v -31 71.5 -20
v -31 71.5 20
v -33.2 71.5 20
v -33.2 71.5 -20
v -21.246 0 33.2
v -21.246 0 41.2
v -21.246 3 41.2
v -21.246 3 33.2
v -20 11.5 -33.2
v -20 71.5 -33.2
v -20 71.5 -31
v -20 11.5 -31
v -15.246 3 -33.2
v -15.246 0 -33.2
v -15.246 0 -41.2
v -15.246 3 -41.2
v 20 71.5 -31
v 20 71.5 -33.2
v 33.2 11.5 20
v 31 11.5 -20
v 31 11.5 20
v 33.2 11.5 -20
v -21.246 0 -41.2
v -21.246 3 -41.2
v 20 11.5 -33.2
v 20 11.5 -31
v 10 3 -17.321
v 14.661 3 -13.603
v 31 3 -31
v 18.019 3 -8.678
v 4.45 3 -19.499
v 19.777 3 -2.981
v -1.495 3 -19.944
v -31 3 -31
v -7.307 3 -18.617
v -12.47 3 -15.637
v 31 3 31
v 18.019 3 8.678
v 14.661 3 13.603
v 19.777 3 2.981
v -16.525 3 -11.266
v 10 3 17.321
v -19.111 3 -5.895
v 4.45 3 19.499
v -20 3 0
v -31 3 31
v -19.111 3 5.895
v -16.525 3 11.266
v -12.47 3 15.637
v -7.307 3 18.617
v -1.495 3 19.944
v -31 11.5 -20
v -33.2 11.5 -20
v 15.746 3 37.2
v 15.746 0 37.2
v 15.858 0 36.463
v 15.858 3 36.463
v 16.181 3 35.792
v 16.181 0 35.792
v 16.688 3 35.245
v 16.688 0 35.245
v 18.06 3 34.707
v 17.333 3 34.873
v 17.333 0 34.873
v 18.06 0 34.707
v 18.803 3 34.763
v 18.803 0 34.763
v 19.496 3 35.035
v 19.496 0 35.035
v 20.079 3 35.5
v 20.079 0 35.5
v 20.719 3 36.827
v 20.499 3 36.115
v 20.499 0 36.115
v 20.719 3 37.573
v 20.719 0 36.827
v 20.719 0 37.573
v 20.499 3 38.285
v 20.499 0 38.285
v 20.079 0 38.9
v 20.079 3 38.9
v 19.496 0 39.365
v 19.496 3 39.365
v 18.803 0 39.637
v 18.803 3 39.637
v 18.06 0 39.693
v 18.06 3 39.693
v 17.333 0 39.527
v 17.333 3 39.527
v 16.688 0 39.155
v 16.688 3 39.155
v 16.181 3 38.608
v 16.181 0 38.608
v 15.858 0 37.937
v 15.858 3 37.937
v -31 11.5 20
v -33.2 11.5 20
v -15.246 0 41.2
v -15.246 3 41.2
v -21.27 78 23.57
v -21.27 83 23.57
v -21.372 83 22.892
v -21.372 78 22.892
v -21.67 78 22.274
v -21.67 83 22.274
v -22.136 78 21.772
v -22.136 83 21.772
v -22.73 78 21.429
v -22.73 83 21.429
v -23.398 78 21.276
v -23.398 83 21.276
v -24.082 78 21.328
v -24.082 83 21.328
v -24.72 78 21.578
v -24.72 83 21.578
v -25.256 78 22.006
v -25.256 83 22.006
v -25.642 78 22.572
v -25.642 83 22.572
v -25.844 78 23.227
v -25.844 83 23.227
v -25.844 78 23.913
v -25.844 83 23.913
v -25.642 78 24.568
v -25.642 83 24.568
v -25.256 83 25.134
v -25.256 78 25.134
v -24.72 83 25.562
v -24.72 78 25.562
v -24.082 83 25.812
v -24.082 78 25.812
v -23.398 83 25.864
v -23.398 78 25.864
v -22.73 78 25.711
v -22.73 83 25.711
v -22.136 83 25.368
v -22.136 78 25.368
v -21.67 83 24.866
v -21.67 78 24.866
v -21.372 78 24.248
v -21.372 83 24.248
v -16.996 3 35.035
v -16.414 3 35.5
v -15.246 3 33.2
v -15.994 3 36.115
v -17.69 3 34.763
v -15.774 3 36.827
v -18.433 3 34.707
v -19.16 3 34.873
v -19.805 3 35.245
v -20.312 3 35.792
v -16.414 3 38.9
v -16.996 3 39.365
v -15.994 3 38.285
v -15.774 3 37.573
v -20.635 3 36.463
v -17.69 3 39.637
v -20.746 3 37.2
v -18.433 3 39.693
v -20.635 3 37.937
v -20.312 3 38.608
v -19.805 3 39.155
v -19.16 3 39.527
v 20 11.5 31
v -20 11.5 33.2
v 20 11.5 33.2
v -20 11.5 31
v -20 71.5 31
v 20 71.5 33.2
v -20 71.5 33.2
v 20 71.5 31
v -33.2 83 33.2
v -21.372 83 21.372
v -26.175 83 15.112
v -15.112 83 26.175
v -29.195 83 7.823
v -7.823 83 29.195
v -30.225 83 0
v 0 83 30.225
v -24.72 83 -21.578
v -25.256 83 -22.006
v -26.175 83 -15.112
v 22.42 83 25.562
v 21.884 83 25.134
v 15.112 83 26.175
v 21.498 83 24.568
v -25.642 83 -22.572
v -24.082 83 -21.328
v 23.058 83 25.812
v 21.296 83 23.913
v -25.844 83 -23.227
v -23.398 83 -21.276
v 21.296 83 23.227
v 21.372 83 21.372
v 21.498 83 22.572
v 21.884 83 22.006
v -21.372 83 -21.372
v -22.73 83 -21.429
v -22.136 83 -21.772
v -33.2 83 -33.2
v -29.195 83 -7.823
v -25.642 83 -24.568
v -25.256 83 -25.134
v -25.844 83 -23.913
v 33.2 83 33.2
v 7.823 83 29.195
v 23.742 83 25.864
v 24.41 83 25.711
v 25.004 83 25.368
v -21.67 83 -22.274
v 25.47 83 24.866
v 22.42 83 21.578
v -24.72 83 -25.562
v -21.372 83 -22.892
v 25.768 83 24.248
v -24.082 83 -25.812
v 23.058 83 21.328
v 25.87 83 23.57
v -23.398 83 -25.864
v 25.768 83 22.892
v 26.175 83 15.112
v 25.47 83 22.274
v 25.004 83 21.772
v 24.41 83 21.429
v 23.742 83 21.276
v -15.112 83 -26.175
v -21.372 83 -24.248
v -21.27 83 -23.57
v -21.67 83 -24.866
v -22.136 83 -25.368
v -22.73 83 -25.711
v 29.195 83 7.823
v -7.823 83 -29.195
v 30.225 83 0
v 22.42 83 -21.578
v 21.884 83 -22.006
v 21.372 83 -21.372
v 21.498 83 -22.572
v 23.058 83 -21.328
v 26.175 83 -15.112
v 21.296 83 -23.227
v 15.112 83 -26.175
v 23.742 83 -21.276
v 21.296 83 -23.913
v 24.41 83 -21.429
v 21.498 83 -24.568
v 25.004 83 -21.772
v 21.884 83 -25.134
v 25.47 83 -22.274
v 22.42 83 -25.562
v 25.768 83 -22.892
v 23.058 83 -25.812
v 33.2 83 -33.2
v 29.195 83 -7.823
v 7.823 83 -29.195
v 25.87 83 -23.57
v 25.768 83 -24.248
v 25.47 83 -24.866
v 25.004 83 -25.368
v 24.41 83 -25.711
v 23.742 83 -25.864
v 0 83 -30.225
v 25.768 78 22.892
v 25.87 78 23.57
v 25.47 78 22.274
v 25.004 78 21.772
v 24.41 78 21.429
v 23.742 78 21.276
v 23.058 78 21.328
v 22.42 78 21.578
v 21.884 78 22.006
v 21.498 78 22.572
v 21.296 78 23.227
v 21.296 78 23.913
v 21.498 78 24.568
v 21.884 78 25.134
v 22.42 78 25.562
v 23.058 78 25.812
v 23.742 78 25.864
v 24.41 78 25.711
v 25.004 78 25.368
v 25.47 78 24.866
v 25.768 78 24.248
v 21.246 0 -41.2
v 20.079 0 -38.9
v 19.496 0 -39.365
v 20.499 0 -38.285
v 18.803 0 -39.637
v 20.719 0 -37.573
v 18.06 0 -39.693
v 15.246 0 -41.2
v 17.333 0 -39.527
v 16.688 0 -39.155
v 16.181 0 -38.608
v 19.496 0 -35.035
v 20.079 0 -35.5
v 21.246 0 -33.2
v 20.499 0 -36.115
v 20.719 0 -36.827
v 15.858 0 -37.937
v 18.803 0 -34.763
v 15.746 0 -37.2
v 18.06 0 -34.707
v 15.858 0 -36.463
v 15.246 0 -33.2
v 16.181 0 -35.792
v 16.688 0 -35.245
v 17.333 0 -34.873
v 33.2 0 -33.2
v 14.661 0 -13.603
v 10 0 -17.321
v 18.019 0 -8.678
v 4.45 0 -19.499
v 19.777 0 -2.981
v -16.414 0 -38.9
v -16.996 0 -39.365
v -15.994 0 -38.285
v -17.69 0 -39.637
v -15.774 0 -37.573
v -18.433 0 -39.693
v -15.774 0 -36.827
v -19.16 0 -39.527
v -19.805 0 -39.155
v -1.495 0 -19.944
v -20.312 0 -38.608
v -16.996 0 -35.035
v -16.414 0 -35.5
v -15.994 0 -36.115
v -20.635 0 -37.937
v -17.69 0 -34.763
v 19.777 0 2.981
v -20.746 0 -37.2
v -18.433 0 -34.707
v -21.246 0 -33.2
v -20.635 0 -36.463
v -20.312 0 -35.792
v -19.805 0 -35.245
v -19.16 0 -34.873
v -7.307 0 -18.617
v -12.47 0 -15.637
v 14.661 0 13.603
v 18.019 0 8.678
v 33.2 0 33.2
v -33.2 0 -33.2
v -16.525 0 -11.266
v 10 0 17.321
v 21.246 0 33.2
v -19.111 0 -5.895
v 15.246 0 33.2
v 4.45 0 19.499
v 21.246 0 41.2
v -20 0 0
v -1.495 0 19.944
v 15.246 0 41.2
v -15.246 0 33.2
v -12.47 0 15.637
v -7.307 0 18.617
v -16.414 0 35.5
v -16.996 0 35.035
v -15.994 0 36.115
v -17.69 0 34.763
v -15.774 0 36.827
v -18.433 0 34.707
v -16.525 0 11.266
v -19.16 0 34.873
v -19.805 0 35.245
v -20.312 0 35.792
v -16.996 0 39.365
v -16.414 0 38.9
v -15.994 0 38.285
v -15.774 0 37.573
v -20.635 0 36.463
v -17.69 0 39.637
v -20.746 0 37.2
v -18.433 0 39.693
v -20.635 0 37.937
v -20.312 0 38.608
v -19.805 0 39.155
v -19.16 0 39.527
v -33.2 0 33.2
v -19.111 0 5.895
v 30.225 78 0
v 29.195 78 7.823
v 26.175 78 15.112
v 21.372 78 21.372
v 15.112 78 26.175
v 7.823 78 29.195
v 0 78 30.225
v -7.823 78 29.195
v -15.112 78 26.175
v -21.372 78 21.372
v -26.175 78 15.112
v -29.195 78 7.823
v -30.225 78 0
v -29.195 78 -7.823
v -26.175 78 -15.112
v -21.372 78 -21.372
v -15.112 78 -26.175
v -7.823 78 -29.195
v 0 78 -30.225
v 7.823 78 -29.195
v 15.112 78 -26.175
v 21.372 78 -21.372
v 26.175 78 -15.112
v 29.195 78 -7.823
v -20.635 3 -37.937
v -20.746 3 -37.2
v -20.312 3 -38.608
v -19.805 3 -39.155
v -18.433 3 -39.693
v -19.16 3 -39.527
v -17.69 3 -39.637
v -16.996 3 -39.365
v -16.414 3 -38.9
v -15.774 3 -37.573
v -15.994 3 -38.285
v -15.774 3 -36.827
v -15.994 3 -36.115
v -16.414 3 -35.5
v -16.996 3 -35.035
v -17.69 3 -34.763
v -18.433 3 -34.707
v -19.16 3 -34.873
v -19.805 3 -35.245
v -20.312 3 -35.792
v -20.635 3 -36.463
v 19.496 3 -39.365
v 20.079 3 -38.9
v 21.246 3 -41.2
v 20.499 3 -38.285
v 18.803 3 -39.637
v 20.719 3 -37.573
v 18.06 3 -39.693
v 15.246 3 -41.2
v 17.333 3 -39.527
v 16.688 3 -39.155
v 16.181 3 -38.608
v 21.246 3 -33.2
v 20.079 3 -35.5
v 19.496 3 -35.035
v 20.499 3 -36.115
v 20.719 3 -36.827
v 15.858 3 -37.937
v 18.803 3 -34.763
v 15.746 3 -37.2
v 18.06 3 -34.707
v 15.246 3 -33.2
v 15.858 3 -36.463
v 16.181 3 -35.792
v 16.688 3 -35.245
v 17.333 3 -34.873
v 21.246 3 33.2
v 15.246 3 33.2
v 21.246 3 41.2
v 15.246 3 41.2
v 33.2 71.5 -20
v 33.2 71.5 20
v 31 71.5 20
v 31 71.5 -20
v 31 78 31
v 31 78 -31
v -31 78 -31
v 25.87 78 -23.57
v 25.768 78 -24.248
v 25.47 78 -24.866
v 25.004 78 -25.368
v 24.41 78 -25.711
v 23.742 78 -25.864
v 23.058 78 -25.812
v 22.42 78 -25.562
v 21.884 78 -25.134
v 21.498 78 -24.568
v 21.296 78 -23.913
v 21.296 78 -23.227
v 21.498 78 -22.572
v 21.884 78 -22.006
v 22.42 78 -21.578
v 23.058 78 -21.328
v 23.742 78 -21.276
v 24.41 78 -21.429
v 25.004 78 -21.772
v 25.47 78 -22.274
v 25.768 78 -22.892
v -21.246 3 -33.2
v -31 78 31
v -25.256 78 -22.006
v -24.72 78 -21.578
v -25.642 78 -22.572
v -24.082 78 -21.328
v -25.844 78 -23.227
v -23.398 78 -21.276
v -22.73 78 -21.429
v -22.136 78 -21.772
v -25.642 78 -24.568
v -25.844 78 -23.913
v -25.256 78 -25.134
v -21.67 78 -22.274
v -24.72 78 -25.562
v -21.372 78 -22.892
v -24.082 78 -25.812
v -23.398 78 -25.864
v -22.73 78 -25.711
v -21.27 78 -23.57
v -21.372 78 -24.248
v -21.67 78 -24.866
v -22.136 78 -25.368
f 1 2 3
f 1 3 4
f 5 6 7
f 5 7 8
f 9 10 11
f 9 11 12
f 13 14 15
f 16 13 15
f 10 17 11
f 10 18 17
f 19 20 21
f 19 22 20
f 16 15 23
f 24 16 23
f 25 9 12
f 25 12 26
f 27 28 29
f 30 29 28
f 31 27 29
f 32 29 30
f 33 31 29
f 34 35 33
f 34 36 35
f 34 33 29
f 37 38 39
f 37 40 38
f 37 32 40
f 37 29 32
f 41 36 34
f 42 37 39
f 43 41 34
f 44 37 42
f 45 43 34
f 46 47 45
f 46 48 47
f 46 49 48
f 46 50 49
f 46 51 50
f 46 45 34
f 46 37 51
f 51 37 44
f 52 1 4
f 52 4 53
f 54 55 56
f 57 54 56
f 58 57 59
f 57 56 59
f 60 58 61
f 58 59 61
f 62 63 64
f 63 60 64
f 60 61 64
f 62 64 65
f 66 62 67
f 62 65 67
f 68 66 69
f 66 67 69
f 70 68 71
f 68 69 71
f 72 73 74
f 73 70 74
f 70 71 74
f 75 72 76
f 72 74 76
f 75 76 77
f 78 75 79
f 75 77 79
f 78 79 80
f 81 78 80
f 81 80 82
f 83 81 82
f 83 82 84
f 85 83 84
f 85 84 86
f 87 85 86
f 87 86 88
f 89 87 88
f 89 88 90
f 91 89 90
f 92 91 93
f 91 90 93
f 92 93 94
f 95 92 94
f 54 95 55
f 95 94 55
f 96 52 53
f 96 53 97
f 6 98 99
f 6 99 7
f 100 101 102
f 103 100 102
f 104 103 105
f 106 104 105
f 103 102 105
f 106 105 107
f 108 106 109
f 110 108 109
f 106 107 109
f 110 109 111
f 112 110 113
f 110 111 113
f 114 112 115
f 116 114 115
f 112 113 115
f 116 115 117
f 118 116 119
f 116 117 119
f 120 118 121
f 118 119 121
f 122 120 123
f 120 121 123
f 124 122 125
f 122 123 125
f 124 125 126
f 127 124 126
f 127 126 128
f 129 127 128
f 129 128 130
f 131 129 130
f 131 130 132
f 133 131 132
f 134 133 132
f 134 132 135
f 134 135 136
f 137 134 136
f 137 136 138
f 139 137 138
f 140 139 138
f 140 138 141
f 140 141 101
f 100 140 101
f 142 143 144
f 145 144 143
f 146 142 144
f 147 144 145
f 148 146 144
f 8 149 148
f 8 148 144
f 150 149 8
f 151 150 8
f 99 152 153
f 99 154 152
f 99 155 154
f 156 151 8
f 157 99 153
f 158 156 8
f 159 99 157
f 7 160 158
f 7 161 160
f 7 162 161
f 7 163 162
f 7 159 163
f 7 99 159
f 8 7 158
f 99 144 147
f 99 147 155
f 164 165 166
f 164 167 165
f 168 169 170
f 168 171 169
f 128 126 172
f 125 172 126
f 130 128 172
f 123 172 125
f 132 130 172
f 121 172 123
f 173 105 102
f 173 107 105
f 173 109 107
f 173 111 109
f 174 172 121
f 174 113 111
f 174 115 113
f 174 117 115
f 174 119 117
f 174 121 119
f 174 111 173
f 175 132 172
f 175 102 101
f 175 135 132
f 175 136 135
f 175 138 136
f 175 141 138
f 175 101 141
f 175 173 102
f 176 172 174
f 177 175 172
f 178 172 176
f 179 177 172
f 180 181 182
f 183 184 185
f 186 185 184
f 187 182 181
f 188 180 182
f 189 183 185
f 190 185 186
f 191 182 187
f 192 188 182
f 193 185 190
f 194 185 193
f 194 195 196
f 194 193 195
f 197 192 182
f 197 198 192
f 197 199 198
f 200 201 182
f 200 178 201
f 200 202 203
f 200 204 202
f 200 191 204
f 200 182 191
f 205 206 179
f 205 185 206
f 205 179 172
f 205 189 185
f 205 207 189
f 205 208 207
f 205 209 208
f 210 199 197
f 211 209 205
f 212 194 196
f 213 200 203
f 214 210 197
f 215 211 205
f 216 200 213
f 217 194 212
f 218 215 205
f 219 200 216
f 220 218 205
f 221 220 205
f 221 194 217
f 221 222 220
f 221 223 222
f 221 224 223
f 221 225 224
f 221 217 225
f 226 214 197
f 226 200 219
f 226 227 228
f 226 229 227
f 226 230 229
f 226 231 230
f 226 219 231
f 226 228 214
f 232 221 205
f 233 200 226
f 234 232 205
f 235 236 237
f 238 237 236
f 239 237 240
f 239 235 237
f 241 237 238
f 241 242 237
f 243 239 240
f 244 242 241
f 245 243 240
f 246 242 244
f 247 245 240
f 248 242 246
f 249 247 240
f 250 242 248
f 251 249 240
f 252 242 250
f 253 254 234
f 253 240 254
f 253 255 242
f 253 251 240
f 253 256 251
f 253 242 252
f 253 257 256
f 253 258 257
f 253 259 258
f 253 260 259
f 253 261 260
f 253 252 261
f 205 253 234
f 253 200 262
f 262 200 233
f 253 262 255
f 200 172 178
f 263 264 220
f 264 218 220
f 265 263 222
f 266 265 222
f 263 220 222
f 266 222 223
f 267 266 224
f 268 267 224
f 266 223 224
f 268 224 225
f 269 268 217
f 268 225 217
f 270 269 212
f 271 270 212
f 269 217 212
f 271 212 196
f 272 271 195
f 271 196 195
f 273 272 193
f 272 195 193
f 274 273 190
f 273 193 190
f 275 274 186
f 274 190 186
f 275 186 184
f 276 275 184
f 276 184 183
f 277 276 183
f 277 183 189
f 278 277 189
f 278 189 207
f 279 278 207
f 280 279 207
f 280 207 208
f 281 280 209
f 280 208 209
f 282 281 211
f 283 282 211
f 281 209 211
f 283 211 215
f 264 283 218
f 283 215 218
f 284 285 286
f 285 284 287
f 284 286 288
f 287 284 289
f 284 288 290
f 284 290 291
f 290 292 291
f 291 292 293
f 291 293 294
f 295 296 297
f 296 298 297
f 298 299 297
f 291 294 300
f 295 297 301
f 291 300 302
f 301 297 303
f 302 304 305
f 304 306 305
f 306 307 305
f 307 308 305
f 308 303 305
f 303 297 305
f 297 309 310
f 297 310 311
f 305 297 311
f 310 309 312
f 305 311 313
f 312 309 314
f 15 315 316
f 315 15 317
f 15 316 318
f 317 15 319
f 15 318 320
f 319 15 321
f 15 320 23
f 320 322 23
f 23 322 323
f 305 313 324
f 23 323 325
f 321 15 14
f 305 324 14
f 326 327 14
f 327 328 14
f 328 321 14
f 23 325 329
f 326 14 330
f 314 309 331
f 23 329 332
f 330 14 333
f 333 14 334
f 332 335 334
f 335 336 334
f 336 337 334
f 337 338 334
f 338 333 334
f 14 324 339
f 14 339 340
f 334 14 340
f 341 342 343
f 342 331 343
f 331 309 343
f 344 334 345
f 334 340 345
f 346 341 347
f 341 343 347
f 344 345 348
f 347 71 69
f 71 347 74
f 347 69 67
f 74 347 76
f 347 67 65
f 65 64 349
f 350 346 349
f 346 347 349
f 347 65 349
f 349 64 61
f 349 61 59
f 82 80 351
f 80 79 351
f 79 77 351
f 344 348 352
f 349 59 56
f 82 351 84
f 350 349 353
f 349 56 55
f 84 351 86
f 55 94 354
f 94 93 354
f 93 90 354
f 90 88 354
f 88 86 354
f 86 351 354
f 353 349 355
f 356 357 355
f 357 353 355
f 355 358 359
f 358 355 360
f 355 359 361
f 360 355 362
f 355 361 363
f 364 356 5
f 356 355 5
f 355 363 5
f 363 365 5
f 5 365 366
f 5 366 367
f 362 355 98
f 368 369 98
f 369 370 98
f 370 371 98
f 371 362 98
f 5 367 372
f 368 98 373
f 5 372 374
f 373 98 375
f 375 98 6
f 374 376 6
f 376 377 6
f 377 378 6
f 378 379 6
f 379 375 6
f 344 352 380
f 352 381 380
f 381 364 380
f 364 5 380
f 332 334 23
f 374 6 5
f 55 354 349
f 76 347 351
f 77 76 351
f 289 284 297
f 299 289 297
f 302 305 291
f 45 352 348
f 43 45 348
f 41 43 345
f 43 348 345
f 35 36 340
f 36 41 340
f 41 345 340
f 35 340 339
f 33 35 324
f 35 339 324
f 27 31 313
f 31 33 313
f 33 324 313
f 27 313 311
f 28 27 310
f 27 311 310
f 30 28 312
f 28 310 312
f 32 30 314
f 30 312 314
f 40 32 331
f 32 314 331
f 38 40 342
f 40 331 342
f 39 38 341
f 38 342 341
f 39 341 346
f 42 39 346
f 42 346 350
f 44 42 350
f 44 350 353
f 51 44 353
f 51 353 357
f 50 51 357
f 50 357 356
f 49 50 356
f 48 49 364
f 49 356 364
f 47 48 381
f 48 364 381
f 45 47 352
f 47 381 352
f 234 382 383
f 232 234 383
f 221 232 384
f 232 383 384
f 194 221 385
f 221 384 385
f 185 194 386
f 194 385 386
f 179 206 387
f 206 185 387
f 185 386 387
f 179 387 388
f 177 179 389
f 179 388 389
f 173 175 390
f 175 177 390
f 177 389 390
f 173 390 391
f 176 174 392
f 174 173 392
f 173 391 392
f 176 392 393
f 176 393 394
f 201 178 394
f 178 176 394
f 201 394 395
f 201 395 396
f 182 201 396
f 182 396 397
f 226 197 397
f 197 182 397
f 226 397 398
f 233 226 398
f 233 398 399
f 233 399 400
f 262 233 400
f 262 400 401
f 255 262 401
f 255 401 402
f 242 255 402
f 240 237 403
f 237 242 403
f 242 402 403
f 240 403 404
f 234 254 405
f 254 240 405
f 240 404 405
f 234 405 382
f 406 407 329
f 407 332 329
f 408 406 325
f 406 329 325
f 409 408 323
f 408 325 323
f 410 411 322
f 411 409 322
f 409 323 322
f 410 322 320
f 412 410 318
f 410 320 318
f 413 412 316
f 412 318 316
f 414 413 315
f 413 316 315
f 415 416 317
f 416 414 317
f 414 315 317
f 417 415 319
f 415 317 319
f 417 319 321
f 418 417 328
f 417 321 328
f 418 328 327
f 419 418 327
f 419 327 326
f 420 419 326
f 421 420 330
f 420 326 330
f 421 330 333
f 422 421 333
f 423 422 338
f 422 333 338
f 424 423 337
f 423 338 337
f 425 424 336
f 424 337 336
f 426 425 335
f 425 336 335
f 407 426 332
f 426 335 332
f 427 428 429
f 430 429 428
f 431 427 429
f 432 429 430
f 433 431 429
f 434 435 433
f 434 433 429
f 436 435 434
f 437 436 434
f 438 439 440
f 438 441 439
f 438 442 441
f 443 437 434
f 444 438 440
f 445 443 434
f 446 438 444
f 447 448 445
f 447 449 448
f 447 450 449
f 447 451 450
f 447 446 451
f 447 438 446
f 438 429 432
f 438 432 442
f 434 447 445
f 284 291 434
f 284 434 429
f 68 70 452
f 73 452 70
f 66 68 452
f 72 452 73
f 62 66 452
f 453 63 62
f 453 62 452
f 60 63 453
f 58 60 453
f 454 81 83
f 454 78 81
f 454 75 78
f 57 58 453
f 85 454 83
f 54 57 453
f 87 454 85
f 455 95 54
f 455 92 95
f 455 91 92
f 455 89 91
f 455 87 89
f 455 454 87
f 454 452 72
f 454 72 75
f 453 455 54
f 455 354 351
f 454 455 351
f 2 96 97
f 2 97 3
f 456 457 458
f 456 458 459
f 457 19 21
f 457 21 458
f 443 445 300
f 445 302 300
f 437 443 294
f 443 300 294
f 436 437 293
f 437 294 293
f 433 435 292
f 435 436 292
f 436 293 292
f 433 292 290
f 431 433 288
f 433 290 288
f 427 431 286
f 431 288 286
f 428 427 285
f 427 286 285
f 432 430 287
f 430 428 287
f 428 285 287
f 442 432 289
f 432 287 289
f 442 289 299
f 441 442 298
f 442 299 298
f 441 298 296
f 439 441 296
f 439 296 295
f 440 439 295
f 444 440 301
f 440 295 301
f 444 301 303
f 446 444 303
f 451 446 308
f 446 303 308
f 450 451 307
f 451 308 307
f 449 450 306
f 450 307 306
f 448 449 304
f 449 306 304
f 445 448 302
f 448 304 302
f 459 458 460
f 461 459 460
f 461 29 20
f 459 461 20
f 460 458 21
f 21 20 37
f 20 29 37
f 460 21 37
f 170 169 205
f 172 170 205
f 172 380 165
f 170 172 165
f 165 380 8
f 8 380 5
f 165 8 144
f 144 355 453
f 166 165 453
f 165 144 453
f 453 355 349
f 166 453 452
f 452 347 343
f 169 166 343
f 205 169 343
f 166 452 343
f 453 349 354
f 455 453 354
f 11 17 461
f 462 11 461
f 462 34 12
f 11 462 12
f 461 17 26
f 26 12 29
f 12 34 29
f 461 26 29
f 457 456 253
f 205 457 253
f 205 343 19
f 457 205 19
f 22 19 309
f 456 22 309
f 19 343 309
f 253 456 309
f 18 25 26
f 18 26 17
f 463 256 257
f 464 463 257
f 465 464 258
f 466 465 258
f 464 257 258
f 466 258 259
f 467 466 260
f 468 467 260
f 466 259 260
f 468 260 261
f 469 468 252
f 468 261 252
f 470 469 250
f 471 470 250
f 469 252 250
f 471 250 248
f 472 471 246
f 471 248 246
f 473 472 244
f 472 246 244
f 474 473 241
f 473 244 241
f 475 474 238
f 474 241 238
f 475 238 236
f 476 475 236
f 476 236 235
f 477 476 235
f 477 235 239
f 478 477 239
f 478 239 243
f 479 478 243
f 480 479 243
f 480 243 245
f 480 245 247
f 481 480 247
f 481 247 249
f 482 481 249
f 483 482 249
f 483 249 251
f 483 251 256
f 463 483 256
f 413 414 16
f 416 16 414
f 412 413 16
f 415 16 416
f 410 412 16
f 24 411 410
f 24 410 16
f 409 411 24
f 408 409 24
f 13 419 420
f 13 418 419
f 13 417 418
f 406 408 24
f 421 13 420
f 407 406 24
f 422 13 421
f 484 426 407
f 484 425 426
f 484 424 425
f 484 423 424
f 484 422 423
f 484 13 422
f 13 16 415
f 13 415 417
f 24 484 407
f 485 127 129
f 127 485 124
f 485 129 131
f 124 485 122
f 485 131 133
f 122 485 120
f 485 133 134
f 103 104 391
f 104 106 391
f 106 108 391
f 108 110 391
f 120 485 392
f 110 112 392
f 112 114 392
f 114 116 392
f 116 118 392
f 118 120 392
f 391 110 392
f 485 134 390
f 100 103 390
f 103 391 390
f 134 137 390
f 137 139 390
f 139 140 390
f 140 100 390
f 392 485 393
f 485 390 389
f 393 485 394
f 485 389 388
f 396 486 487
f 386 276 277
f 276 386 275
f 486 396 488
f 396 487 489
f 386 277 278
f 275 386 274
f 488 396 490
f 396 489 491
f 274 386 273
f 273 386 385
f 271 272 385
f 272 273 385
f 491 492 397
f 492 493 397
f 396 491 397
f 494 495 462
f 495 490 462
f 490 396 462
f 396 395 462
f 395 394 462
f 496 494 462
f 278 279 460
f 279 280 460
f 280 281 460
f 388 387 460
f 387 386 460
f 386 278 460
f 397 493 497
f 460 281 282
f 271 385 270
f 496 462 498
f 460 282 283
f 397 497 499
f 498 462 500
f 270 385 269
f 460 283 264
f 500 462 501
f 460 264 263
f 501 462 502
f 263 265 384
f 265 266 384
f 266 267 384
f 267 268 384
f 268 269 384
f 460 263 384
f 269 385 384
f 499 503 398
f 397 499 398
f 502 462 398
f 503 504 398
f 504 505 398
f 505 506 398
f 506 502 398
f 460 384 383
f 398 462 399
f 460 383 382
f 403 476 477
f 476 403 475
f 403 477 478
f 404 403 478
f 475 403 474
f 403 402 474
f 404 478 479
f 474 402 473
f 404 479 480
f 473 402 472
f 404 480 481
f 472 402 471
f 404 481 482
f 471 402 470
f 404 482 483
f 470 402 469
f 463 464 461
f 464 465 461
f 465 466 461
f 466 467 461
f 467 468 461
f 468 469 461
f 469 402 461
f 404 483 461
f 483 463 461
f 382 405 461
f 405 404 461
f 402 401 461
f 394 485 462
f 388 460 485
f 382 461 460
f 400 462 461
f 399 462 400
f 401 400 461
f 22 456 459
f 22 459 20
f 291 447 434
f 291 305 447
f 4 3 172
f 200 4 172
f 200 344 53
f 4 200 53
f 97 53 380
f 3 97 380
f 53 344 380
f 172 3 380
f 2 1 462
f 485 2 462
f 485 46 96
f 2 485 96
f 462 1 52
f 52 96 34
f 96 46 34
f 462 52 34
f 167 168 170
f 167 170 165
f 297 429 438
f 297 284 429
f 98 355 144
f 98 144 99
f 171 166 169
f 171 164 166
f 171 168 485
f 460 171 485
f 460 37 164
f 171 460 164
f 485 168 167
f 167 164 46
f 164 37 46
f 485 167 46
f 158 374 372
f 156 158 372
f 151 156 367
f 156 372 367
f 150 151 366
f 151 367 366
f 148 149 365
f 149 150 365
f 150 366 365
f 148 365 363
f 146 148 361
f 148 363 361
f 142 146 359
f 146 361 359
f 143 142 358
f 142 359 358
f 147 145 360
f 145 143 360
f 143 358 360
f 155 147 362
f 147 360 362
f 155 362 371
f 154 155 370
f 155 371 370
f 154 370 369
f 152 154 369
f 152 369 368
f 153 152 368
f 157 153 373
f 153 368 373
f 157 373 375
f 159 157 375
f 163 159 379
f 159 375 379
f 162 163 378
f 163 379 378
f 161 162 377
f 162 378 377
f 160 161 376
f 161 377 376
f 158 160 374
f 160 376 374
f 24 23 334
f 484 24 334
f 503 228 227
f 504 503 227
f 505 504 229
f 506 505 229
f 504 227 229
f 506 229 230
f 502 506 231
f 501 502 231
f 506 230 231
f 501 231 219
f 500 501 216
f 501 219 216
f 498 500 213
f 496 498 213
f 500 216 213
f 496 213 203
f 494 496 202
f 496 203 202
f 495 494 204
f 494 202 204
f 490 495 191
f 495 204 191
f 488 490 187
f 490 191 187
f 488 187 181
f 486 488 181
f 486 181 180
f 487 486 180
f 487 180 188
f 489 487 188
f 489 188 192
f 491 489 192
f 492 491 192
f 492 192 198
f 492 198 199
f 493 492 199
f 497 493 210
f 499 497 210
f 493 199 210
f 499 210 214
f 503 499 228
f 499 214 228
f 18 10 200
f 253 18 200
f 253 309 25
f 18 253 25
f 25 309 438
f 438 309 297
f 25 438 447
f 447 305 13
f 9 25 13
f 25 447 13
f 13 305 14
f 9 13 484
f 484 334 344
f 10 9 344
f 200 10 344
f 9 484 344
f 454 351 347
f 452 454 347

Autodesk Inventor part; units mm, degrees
ref_plane "YZ Plane" through (0, 0, 0) normal (1, 0, 0) x (0, 1, 0)
ref_plane "XZ Plane" through (0, 0, 0) normal (0, 1, 0) x (-1, 0, 0)
ref_plane "XY Plane" through (0, 0, 0) normal (0, 0, 1) x (1, 0, 0)
sketch "Sketch1" plane through (0, 0, 0) normal (0, 1, 0) x (-1, 0, 0)
  line L0 (28.2, -28.2) -> (-28.2, -28.2)
  line L1 (-28.2, -28.2) -> (-28.2, 28.2)
  line L2 (-28.2, 28.2) -> (28.2, 28.2)
  line L3 (28.2, 28.2) -> (28.2, -28.2)
  line L4 (28.2, -28.2) -> (-28.2, 28.2) construction
  line L5 (-28.2, -28.2) -> (28.2, 28.2) construction
  line L6 (33.2, -33.2) -> (-33.2, -33.2)
  line L7 (-33.2, -33.2) -> (-33.2, 33.2)
  line L8 (-33.2, 33.2) -> (33.2, 33.2)
  line L9 (33.2, 33.2) -> (33.2, -33.2)
  line L10 (33.2, -33.2) -> (-33.2, 33.2) construction
  line L11 (-33.2, -33.2) -> (33.2, 33.2) construction
  circle A0 centre (0, 0) radius 20
  line L12 (-21.2465, -33.2) -> (-15.2465, -33.2)
  line L13 (-15.2465, -33.2) -> (-15.2465, -41.2)
  line L14 (-15.2465, -41.2) -> (-21.2465, -41.2)
  line L15 (-21.2465, -41.2) -> (-21.2465, -33.2)
  circle A1 centre (-18.2465, -37.2) radius 2.5
  line L16 (-33.2, 0) -> (33.2, 0) construction
  line L17 (0, -33.2) -> (0, 33.2) construction
  line L18 (-21.2465, 33.2) -> (-15.2465, 33.2)
  line L19 (-15.2465, 33.2) -> (-15.2465, 41.2)
  line L20 (-15.2465, 41.2) -> (-21.2465, 41.2)
  line L21 (-21.2465, 41.2) -> (-21.2465, 33.2)
  circle A2 centre (-18.2465, 37.2) radius 2.5
  line L22 (21.2465, -33.2) -> (15.2465, -33.2)
  line L23 (15.2465, -33.2) -> (15.2465, -41.2)
  line L24 (15.2465, -41.2) -> (21.2465, -41.2)
  line L25 (21.2465, -41.2) -> (21.2465, -33.2)
  circle A3 centre (18.2465, -37.2) radius 2.5
  circle A4 centre (18.2465, 37.2) radius 2.5
  line L26 (15.2465, 33.2) -> (15.2465, 41.2)
  line L27 (15.2465, 41.2) -> (21.2465, 41.2)
  line L28 (21.2465, 41.2) -> (21.2465, 33.2)
  line L29 (21.2465, 33.2) -> (15.2465, 33.2)
  dimension "d0" = 56.4
  dimension "d1" = 5
  dimension "d2" = 5
  dimension "d3" = 40
  dimension "d20" = 6
  dimension "d21" = 5
  dimension "d22" = 3
  dimension "d23" = 4
  dimension "d24" = 8
extrude "Extrusion1" add sketch "Sketch1" along normal blind 3 contours L0 L1 L2 L3 | L6 L7 L8 L9 | L25 L24 L23 L6 | L8 L26 L27 L28 | L13 L14 L15 L6 | L8 L21 L20 L19
sketch "Sketch2" plane through (0, 3, 0) normal (0, 1, 0) x (1, 0, 0)
  line L0 (-33.2, -33.2) -> (-21.2465, -33.2) projected
  line L1 (33.2, -33.2) -> (33.2, 33.2) projected
  line L2 (33.2, 33.2) -> (21.2465, 33.2) projected
  line L3 (-33.2, 33.2) -> (-33.2, -33.2) projected
  circle A0 centre (0, 0) radius 20 projected
  line L4 (-31, 31) -> (31, 31)
  line L5 (31, 31) -> (31, -31)
  line L6 (31, -31) -> (-31, -31)
  line L7 (-31, -31) -> (-31, 31)
  line L8 (-31, 31) -> (31, -31) construction
  line L9 (31, 31) -> (-31, -31) construction
  line L10 (-21.2465, -33.2) -> (-21.2465, -41.2) projected
  line L11 (-21.2465, -41.2) -> (-15.2465, -41.2) projected
  line L12 (-15.2465, -41.2) -> (-15.2465, -33.2) projected
  line L13 (-15.2465, -33.2) -> (15.2465, -33.2) projected
  line L14 (15.2465, -33.2) -> (15.2465, -41.2) projected
  line L15 (15.2465, -41.2) -> (21.2465, -41.2) projected
  line L16 (21.2465, -41.2) -> (21.2465, -33.2) projected
  line L17 (21.2465, -33.2) -> (33.2, -33.2) projected
  line L18 (21.2465, 33.2) -> (21.2465, 41.2) projected
  line L19 (21.2465, 41.2) -> (15.2465, 41.2) projected
  line L20 (15.2465, 41.2) -> (15.2465, 33.2) projected
  line L21 (15.2465, 33.2) -> (-15.2465, 33.2) projected
  line L22 (-15.2465, 33.2) -> (-15.2465, 41.2) projected
  line L23 (-15.2465, 41.2) -> (-21.2465, 41.2) projected
  line L24 (-21.2465, 41.2) -> (-21.2465, 33.2) projected
  line L25 (-21.2465, 33.2) -> (-33.2, 33.2) projected
  line L26 (33.2, 33.2) -> (21.2465, 33.2) projected
  line L27 (15.2465, 41.2) -> (15.2465, 33.2) projected
  line L28 (33.2, -33.2) -> (33.2, 33.2) projected
  line L29 (33.2, 33.2) -> (-33.2, 33.2)
  line L30 (21.2465, -33.2) -> (33.2, -33.2) projected
  line L31 (33.2, -33.2) -> (-33.2, -33.2)
  dimension "d6" = 62
  dimension "d7" = 62
extrude "Extrusion2" add sketch "Sketch2" along normal blind 75 contours L3 L25 L29 L21 L2 L1 L17 L31 L13 L0
sketch "Sketch3" plane through (0, 78, 0) normal (0, 1, 0) x (1, 0, 0)
  line L0 (33.2, -33.2) -> (33.2, 33.2) projected
  line L1 (33.2, 33.2) -> (-33.2, 33.2) projected
  line L2 (-33.2, 33.2) -> (-33.2, -33.2) projected
  line L3 (-33.2, -33.2) -> (33.2, -33.2) projected
  line L4 (-31, 31) -> (31, 31) projected
  line L5 (31, 31) -> (31, -31) projected
  line L6 (31, -31) -> (-31, -31) projected
  line L7 (-31, -31) -> (-31, 31) projected
  circle A0 centre (0, 0) radius 28.2247 construction
  circle A1 centre (0, 0) radius 30.2247
  point P0 (-30, 3.4699)
  point P1 (-3.4699, 30)
  point P2 (3.4699, 30)
  point P3 (30, 3.4699)
  point P4 (30, -3.4699)
  point P5 (3.4699, -30)
  point P6 (-3.4699, -30)
  point P7 (-30, -3.4699)
  dimension "d11" = 2
extrude "Extrusion3" add sketch "Sketch3" along normal blind 5 contours L3 L2 L1 L0 | L4 L5 L6 L7
sketch "Sketch4" plane through (0, 83, 0) normal (0, 1, 0) x (1, 0, 0)
  line L0 (33.2, 33.2) -> (-33.2, 33.2) projected
  line L1 (-33.2, 33.2) -> (-33.2, -33.2) projected
  line L2 (-33.2, -33.2) -> (33.2, -33.2) projected
  line L3 (33.2, -33.2) -> (33.2, 33.2) projected
  line L4 (33.2, -33.2) -> (33.2, 33.2) construction
  line L5 (33.2, 0) -> (-33.2, 0) construction
  line L6 (0, 33.2) -> (0, -33.2) construction
  circle A0 centre (23.57, 23.57) radius 2.3
  circle A1 centre (23.57, -23.57) radius 2.3
  circle A2 centre (-23.57, 23.57) radius 2.3
  circle A3 centre (-23.57, -23.57) radius 2.3
  point P0 (0, 0)
  dimension "d14" = 47.14
  dimension "d15" = 4.6
  dimension "d18" = 47.14
extrude "Extrusion4" cut sketch "Sketch4" against normal blind 10 contours A0 | A1 | A2 | A3
sketch "Sketch5" plane through (33.2, 0, 33.2) normal (1, 0, 0) x (0, 0, -1)
  line L0 (-8, 0) -> (0, 0) projected
  line L1 (-8, 0) -> (0, 0) projected
  line L2 (0, 0) -> (0, 3) projected
  line L3 (-8, 3) -> (0, 3) projected
  line L4 (-8, 0) -> (-8, 3) projected
  line L5 (0, 0) -> (66.4, 0) projected
  line L6 (66.4, 0) -> (66.4, 83) projected
  line L7 (0, 83) -> (66.4, 83) projected
  line L8 (0, 0) -> (0, 83) projected
  line L9 (66.4, 3) -> (74.4, 3) projected
  line L10 (66.4, 0) -> (74.4, 0) projected
  line L11 (66.4, 0) -> (74.4, 0) projected
  line L12 (74.4, 0) -> (74.4, 3) projected
  line L13 (66.4, 3) -> (74.4, 3) projected
  line L14 (66.4, 0) -> (66.4, 3) projected
  line L15 (74.4, 3) -> (66.4, 3) construction
  line L16 (0, 3) -> (66.4, 3) construction
  line L17 (33.2, 0) -> (33.2, 83) construction
  line L18 (0, 0) -> (0, 83) construction
  line L19 (0, 41.5) -> (66.4, 41.5) construction
  line L20 (66.4, 0) -> (66.4, 83) construction
  line L21 (13.2, 71.5) -> (53.2, 71.5)
  line L22 (53.2, 71.5) -> (53.2, 11.5)
  line L23 (53.2, 11.5) -> (13.2, 11.5)
  line L24 (13.2, 11.5) -> (13.2, 71.5)
  line L25 (13.2, 71.5) -> (53.2, 11.5) construction
  line L26 (53.2, 71.5) -> (13.2, 11.5) construction
  point P0 (33.2, 41.5)
  dimension "d27" = 40
  dimension "d28" = 60
extrude "Extrusion5" cut sketch "Sketch5" against normal through all contours L21 L22 L23 L24
sketch "Sketch6" plane through (15.2465, 0, -33.2) normal (0, 0, -1) x (-1, 0, 0)
  line L0 (-17.9535, 0) -> (-6, 0) projected
  line L1 (-6, 0) -> (-6, 3) projected
  line L2 (0, 3) -> (-6, 3) projected
  line L3 (0, 0) -> (0, 3) projected
  line L4 (0, 0) -> (30.493, 0) projected
  line L5 (30.493, 0) -> (30.493, 3) projected
  line L6 (36.493, 3) -> (30.493, 3) projected
  line L7 (36.493, 0) -> (36.493, 3) projected
  line L8 (36.493, 0) -> (48.4465, 0) projected
  line L9 (48.4465, 0) -> (48.4465, 83) projected
  line L10 (-17.9535, 83) -> (48.4465, 83) projected
  line L11 (-17.9535, 0) -> (-17.9535, 83) projected
  line L12 (-17.9535, 11.5) -> (-17.9535, 71.5) construction
  line L13 (-17.9535, 41.5) -> (48.4465, 41.5) construction
  line L14 (48.4465, 0) -> (48.4465, 83) construction
  line L15 (48.4465, 83) -> (-17.9535, 83) construction
  line L16 (15.2465, 83) -> (15.2465, 0) construction
  line L17 (-4.7535, 71.5) -> (35.2465, 71.5)
  line L18 (35.2465, 71.5) -> (35.2465, 11.5)
  line L19 (35.2465, 11.5) -> (-4.7535, 11.5)
  line L20 (-4.7535, 11.5) -> (-4.7535, 71.5)
  line L21 (-4.7535, 71.5) -> (35.2465, 11.5) construction
  line L22 (35.2465, 71.5) -> (-4.7535, 11.5) construction
  point P0 (15.2465, 41.5)
  dimension "d29" = 40
  dimension "d30" = 60
extrude "Extrusion6" cut sketch "Sketch6" against normal up to surface (66.4 mm away) contours L17 L18 L19 L20
properties part number "Motor case"
